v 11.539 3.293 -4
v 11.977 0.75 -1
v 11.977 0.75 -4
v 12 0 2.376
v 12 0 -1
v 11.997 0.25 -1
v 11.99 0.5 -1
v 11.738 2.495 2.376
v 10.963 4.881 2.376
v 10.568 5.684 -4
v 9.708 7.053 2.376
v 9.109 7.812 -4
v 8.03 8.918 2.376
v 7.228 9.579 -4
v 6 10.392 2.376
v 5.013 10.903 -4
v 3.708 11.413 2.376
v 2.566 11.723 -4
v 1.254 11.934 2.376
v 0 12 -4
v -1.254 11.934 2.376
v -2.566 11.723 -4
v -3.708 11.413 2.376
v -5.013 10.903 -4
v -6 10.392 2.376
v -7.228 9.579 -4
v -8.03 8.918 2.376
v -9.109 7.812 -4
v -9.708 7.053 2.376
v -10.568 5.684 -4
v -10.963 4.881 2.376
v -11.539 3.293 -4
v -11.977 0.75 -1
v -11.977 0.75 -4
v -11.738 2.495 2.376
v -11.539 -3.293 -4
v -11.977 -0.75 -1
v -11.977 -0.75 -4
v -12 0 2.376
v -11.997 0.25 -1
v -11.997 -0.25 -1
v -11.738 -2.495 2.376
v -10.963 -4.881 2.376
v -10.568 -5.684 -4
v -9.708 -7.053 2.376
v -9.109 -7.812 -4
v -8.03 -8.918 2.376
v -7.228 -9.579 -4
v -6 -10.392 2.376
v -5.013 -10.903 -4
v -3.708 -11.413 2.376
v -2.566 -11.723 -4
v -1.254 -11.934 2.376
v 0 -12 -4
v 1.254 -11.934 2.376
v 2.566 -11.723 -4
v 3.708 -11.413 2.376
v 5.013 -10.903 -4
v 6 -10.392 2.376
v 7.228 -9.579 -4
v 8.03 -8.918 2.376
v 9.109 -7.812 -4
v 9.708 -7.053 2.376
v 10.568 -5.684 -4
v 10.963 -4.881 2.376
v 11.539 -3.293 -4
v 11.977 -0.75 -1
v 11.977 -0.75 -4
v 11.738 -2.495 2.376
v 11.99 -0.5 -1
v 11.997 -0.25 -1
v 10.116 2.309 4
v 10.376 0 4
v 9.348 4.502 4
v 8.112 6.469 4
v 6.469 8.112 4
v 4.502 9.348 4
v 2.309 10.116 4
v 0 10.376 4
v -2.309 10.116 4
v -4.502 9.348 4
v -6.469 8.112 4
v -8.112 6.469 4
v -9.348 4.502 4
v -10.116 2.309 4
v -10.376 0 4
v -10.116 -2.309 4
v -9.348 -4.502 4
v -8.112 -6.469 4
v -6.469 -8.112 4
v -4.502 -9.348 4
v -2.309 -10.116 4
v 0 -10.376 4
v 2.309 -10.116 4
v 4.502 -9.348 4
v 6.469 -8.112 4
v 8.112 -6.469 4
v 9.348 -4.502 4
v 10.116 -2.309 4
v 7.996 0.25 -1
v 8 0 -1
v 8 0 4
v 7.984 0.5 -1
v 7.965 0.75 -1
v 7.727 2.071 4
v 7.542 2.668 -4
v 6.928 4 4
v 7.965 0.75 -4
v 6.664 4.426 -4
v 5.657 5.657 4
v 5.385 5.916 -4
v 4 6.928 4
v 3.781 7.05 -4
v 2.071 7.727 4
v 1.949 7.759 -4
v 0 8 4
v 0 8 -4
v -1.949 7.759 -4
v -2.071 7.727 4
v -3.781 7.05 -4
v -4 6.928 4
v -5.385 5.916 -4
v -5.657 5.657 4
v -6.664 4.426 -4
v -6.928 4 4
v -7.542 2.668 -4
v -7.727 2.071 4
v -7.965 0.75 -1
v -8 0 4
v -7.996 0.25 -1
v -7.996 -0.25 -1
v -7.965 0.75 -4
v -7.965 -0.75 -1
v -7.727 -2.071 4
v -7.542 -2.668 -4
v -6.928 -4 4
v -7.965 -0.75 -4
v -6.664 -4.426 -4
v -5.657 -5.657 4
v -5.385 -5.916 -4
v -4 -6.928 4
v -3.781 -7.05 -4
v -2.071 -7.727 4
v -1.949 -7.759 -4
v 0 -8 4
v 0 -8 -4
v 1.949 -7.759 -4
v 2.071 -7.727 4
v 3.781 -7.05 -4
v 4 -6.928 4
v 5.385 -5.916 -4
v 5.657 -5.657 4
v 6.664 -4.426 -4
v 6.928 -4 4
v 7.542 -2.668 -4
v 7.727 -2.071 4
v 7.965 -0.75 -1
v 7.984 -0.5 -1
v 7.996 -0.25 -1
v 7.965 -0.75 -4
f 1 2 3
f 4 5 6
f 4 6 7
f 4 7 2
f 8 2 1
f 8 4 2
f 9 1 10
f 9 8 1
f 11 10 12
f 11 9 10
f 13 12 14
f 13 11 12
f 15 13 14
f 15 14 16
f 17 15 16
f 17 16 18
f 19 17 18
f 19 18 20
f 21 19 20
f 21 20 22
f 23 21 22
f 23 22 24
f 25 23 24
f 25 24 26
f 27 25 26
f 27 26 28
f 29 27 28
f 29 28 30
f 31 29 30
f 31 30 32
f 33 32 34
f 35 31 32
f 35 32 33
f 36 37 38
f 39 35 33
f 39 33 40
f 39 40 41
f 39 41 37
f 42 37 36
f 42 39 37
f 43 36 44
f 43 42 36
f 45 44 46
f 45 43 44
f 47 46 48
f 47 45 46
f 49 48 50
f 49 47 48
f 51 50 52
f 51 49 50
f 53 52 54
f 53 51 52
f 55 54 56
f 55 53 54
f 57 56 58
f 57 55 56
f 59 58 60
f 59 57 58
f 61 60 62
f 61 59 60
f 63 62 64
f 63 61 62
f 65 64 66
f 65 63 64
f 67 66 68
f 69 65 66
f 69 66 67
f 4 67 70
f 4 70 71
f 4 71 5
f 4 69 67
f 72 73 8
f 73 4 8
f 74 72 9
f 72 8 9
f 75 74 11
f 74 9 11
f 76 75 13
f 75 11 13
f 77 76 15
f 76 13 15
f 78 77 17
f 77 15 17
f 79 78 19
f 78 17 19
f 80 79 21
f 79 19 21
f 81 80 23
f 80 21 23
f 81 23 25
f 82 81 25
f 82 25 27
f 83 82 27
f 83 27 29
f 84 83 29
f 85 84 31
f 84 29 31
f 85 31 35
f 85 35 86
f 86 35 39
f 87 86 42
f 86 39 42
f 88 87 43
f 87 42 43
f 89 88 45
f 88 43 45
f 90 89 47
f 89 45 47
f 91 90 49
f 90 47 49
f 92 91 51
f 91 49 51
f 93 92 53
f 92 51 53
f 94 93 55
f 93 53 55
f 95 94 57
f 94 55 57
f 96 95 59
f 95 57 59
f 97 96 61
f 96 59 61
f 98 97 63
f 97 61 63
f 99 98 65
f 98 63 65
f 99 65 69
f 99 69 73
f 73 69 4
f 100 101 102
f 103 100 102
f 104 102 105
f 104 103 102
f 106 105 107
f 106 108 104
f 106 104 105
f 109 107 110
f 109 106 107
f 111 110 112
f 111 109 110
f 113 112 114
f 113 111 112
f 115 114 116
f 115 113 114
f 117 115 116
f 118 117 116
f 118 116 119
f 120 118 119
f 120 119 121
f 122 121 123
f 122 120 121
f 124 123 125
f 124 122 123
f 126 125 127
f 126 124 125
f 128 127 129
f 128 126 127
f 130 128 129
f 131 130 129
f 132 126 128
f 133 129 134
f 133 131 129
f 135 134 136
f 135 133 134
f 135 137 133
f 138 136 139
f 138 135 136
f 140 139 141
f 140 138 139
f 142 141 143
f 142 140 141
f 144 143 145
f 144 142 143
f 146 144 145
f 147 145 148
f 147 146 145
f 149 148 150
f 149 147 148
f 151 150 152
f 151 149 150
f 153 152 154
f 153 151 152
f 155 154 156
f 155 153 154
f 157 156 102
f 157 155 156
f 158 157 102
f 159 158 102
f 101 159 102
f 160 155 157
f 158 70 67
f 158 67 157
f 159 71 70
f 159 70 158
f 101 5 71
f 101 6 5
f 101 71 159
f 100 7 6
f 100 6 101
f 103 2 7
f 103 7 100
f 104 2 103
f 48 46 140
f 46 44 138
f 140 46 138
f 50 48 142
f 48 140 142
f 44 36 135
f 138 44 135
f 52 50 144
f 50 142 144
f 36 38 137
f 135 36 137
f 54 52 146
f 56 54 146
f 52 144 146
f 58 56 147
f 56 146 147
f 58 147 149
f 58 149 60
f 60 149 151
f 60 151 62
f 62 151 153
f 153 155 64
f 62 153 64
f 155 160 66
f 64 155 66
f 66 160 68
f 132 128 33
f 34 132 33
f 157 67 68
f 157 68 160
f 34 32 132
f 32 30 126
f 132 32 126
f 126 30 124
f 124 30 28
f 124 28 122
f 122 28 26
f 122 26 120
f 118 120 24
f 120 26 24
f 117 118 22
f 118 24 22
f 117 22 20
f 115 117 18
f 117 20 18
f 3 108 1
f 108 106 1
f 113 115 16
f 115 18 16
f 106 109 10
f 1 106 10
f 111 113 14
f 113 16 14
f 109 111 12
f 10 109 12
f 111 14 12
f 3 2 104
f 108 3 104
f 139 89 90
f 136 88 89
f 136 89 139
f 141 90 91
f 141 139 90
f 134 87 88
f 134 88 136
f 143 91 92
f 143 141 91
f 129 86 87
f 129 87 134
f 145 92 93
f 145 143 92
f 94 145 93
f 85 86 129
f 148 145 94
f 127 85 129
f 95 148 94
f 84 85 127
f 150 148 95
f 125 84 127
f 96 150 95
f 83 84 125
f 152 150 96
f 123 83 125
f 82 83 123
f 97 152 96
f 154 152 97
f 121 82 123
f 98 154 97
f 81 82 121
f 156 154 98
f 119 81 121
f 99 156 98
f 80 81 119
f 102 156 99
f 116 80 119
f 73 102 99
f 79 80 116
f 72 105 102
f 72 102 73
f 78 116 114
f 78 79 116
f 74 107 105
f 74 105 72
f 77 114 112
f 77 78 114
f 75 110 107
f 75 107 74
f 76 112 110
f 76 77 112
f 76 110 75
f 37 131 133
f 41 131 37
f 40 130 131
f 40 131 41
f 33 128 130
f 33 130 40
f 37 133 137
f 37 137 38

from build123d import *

# Parameters (mm, degrees)
SKETCH_1_R               = 12
SKETCH_1_R_2             = 8
EXTRUDE_1_DEPTH          = 4
CUT_EXTRUDE_1_DEPTH      = 19.761663039
CUT_EXTRUDE_1_DEPTH_BACK = 3
SKETCH_3_W               = 39.283858622
SKETCH_3_H               = 1.5


# Read off the part's stored shape, not the designer's step: M24 机械螺纹 螺柱1
with BuildPart() as part:
    # 草图1 → 凸台-拉伸1 (new, symmetric)
    with BuildSketch(Plane.XY):
        Circle(SKETCH_1_R)
        Circle(SKETCH_1_R_2, mode=Mode.SUBTRACT)
    extrude(amount=EXTRUDE_1_DEPTH, both=True)

    # M24 机械螺纹 螺柱1 outline → M24 机械螺纹 螺柱1 (revolve, cut)
    with BuildSketch(Plane.XZ):
        Polygon((12, 4), (10.376, 4), (12, 2.376), align=None)
    revolve(axis=Axis((0, 0, 0), (0, 0, 1)), mode=Mode.SUBTRACT)

    # 草图3 → 切除-拉伸-薄壁1 (cut, two sides: drawn at the far end of the back side and taken through both)
    with BuildSketch(Plane(origin=(0, 0, -4), x_dir=(-1, 0, 0), z_dir=(0, 0, -1)).offset(-CUT_EXTRUDE_1_DEPTH_BACK)):
        Rectangle(SKETCH_3_W, SKETCH_3_H)
    extrude(amount=CUT_EXTRUDE_1_DEPTH + CUT_EXTRUDE_1_DEPTH_BACK, mode=Mode.SUBTRACT)


solid = part.part
